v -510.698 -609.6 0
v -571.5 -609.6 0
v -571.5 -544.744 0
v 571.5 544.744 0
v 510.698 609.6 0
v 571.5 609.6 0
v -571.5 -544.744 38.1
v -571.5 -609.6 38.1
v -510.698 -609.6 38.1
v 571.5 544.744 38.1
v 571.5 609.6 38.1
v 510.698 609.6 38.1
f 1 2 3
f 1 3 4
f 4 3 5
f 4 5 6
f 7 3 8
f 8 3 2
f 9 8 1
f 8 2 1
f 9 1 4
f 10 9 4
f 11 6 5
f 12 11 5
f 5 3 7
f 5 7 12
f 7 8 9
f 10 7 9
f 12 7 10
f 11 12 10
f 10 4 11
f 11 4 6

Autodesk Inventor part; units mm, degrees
ref_plane "YZ Plane" through (0, 0, 0) normal (1, 0, 0) x (0, 1, 0)
ref_plane "XZ Plane" through (0, 0, 0) normal (0, 1, 0) x (-1, 0, 0)
ref_plane "XY Plane" through (0, 0, 0) normal (0, 0, 1) x (1, 0, 0)
sketch "Sketch1" plane through (0, 0, 0) normal (0, 0, 1) x (1, 0, 0)
  line L0 (-571.5, -609.6) -> (571.5, -609.6)
  line L1 (571.5, -609.6) -> (571.5, 609.6)
  line L2 (571.5, 609.6) -> (-571.5, 609.6)
  line L3 (-571.5, 609.6) -> (-571.5, -609.6)
  line L4 (-571.5, -609.6) -> (571.5, 609.6) construction
  line L5 (571.5, -609.6) -> (-571.5, 609.6) construction
  line L6 (-30.4012, 32.4279) -> (30.4012, -32.4279)
  line L7 (-510.6976, -609.6) -> (571.5, 544.7441)
  line L8 (-571.5, -544.7441) -> (510.6976, 609.6)
  point P0 (0, 0)
  point P1 (474.8791, 609.6)
  dimension "d6" = 88.9
extrude "Extrusion1" add sketch "Sketch1" along normal blind 38.1 contours L3 L8 L6 L7 L0 | L6 L8 L2 L1 L7
properties part number "S_2x4x65.795"
